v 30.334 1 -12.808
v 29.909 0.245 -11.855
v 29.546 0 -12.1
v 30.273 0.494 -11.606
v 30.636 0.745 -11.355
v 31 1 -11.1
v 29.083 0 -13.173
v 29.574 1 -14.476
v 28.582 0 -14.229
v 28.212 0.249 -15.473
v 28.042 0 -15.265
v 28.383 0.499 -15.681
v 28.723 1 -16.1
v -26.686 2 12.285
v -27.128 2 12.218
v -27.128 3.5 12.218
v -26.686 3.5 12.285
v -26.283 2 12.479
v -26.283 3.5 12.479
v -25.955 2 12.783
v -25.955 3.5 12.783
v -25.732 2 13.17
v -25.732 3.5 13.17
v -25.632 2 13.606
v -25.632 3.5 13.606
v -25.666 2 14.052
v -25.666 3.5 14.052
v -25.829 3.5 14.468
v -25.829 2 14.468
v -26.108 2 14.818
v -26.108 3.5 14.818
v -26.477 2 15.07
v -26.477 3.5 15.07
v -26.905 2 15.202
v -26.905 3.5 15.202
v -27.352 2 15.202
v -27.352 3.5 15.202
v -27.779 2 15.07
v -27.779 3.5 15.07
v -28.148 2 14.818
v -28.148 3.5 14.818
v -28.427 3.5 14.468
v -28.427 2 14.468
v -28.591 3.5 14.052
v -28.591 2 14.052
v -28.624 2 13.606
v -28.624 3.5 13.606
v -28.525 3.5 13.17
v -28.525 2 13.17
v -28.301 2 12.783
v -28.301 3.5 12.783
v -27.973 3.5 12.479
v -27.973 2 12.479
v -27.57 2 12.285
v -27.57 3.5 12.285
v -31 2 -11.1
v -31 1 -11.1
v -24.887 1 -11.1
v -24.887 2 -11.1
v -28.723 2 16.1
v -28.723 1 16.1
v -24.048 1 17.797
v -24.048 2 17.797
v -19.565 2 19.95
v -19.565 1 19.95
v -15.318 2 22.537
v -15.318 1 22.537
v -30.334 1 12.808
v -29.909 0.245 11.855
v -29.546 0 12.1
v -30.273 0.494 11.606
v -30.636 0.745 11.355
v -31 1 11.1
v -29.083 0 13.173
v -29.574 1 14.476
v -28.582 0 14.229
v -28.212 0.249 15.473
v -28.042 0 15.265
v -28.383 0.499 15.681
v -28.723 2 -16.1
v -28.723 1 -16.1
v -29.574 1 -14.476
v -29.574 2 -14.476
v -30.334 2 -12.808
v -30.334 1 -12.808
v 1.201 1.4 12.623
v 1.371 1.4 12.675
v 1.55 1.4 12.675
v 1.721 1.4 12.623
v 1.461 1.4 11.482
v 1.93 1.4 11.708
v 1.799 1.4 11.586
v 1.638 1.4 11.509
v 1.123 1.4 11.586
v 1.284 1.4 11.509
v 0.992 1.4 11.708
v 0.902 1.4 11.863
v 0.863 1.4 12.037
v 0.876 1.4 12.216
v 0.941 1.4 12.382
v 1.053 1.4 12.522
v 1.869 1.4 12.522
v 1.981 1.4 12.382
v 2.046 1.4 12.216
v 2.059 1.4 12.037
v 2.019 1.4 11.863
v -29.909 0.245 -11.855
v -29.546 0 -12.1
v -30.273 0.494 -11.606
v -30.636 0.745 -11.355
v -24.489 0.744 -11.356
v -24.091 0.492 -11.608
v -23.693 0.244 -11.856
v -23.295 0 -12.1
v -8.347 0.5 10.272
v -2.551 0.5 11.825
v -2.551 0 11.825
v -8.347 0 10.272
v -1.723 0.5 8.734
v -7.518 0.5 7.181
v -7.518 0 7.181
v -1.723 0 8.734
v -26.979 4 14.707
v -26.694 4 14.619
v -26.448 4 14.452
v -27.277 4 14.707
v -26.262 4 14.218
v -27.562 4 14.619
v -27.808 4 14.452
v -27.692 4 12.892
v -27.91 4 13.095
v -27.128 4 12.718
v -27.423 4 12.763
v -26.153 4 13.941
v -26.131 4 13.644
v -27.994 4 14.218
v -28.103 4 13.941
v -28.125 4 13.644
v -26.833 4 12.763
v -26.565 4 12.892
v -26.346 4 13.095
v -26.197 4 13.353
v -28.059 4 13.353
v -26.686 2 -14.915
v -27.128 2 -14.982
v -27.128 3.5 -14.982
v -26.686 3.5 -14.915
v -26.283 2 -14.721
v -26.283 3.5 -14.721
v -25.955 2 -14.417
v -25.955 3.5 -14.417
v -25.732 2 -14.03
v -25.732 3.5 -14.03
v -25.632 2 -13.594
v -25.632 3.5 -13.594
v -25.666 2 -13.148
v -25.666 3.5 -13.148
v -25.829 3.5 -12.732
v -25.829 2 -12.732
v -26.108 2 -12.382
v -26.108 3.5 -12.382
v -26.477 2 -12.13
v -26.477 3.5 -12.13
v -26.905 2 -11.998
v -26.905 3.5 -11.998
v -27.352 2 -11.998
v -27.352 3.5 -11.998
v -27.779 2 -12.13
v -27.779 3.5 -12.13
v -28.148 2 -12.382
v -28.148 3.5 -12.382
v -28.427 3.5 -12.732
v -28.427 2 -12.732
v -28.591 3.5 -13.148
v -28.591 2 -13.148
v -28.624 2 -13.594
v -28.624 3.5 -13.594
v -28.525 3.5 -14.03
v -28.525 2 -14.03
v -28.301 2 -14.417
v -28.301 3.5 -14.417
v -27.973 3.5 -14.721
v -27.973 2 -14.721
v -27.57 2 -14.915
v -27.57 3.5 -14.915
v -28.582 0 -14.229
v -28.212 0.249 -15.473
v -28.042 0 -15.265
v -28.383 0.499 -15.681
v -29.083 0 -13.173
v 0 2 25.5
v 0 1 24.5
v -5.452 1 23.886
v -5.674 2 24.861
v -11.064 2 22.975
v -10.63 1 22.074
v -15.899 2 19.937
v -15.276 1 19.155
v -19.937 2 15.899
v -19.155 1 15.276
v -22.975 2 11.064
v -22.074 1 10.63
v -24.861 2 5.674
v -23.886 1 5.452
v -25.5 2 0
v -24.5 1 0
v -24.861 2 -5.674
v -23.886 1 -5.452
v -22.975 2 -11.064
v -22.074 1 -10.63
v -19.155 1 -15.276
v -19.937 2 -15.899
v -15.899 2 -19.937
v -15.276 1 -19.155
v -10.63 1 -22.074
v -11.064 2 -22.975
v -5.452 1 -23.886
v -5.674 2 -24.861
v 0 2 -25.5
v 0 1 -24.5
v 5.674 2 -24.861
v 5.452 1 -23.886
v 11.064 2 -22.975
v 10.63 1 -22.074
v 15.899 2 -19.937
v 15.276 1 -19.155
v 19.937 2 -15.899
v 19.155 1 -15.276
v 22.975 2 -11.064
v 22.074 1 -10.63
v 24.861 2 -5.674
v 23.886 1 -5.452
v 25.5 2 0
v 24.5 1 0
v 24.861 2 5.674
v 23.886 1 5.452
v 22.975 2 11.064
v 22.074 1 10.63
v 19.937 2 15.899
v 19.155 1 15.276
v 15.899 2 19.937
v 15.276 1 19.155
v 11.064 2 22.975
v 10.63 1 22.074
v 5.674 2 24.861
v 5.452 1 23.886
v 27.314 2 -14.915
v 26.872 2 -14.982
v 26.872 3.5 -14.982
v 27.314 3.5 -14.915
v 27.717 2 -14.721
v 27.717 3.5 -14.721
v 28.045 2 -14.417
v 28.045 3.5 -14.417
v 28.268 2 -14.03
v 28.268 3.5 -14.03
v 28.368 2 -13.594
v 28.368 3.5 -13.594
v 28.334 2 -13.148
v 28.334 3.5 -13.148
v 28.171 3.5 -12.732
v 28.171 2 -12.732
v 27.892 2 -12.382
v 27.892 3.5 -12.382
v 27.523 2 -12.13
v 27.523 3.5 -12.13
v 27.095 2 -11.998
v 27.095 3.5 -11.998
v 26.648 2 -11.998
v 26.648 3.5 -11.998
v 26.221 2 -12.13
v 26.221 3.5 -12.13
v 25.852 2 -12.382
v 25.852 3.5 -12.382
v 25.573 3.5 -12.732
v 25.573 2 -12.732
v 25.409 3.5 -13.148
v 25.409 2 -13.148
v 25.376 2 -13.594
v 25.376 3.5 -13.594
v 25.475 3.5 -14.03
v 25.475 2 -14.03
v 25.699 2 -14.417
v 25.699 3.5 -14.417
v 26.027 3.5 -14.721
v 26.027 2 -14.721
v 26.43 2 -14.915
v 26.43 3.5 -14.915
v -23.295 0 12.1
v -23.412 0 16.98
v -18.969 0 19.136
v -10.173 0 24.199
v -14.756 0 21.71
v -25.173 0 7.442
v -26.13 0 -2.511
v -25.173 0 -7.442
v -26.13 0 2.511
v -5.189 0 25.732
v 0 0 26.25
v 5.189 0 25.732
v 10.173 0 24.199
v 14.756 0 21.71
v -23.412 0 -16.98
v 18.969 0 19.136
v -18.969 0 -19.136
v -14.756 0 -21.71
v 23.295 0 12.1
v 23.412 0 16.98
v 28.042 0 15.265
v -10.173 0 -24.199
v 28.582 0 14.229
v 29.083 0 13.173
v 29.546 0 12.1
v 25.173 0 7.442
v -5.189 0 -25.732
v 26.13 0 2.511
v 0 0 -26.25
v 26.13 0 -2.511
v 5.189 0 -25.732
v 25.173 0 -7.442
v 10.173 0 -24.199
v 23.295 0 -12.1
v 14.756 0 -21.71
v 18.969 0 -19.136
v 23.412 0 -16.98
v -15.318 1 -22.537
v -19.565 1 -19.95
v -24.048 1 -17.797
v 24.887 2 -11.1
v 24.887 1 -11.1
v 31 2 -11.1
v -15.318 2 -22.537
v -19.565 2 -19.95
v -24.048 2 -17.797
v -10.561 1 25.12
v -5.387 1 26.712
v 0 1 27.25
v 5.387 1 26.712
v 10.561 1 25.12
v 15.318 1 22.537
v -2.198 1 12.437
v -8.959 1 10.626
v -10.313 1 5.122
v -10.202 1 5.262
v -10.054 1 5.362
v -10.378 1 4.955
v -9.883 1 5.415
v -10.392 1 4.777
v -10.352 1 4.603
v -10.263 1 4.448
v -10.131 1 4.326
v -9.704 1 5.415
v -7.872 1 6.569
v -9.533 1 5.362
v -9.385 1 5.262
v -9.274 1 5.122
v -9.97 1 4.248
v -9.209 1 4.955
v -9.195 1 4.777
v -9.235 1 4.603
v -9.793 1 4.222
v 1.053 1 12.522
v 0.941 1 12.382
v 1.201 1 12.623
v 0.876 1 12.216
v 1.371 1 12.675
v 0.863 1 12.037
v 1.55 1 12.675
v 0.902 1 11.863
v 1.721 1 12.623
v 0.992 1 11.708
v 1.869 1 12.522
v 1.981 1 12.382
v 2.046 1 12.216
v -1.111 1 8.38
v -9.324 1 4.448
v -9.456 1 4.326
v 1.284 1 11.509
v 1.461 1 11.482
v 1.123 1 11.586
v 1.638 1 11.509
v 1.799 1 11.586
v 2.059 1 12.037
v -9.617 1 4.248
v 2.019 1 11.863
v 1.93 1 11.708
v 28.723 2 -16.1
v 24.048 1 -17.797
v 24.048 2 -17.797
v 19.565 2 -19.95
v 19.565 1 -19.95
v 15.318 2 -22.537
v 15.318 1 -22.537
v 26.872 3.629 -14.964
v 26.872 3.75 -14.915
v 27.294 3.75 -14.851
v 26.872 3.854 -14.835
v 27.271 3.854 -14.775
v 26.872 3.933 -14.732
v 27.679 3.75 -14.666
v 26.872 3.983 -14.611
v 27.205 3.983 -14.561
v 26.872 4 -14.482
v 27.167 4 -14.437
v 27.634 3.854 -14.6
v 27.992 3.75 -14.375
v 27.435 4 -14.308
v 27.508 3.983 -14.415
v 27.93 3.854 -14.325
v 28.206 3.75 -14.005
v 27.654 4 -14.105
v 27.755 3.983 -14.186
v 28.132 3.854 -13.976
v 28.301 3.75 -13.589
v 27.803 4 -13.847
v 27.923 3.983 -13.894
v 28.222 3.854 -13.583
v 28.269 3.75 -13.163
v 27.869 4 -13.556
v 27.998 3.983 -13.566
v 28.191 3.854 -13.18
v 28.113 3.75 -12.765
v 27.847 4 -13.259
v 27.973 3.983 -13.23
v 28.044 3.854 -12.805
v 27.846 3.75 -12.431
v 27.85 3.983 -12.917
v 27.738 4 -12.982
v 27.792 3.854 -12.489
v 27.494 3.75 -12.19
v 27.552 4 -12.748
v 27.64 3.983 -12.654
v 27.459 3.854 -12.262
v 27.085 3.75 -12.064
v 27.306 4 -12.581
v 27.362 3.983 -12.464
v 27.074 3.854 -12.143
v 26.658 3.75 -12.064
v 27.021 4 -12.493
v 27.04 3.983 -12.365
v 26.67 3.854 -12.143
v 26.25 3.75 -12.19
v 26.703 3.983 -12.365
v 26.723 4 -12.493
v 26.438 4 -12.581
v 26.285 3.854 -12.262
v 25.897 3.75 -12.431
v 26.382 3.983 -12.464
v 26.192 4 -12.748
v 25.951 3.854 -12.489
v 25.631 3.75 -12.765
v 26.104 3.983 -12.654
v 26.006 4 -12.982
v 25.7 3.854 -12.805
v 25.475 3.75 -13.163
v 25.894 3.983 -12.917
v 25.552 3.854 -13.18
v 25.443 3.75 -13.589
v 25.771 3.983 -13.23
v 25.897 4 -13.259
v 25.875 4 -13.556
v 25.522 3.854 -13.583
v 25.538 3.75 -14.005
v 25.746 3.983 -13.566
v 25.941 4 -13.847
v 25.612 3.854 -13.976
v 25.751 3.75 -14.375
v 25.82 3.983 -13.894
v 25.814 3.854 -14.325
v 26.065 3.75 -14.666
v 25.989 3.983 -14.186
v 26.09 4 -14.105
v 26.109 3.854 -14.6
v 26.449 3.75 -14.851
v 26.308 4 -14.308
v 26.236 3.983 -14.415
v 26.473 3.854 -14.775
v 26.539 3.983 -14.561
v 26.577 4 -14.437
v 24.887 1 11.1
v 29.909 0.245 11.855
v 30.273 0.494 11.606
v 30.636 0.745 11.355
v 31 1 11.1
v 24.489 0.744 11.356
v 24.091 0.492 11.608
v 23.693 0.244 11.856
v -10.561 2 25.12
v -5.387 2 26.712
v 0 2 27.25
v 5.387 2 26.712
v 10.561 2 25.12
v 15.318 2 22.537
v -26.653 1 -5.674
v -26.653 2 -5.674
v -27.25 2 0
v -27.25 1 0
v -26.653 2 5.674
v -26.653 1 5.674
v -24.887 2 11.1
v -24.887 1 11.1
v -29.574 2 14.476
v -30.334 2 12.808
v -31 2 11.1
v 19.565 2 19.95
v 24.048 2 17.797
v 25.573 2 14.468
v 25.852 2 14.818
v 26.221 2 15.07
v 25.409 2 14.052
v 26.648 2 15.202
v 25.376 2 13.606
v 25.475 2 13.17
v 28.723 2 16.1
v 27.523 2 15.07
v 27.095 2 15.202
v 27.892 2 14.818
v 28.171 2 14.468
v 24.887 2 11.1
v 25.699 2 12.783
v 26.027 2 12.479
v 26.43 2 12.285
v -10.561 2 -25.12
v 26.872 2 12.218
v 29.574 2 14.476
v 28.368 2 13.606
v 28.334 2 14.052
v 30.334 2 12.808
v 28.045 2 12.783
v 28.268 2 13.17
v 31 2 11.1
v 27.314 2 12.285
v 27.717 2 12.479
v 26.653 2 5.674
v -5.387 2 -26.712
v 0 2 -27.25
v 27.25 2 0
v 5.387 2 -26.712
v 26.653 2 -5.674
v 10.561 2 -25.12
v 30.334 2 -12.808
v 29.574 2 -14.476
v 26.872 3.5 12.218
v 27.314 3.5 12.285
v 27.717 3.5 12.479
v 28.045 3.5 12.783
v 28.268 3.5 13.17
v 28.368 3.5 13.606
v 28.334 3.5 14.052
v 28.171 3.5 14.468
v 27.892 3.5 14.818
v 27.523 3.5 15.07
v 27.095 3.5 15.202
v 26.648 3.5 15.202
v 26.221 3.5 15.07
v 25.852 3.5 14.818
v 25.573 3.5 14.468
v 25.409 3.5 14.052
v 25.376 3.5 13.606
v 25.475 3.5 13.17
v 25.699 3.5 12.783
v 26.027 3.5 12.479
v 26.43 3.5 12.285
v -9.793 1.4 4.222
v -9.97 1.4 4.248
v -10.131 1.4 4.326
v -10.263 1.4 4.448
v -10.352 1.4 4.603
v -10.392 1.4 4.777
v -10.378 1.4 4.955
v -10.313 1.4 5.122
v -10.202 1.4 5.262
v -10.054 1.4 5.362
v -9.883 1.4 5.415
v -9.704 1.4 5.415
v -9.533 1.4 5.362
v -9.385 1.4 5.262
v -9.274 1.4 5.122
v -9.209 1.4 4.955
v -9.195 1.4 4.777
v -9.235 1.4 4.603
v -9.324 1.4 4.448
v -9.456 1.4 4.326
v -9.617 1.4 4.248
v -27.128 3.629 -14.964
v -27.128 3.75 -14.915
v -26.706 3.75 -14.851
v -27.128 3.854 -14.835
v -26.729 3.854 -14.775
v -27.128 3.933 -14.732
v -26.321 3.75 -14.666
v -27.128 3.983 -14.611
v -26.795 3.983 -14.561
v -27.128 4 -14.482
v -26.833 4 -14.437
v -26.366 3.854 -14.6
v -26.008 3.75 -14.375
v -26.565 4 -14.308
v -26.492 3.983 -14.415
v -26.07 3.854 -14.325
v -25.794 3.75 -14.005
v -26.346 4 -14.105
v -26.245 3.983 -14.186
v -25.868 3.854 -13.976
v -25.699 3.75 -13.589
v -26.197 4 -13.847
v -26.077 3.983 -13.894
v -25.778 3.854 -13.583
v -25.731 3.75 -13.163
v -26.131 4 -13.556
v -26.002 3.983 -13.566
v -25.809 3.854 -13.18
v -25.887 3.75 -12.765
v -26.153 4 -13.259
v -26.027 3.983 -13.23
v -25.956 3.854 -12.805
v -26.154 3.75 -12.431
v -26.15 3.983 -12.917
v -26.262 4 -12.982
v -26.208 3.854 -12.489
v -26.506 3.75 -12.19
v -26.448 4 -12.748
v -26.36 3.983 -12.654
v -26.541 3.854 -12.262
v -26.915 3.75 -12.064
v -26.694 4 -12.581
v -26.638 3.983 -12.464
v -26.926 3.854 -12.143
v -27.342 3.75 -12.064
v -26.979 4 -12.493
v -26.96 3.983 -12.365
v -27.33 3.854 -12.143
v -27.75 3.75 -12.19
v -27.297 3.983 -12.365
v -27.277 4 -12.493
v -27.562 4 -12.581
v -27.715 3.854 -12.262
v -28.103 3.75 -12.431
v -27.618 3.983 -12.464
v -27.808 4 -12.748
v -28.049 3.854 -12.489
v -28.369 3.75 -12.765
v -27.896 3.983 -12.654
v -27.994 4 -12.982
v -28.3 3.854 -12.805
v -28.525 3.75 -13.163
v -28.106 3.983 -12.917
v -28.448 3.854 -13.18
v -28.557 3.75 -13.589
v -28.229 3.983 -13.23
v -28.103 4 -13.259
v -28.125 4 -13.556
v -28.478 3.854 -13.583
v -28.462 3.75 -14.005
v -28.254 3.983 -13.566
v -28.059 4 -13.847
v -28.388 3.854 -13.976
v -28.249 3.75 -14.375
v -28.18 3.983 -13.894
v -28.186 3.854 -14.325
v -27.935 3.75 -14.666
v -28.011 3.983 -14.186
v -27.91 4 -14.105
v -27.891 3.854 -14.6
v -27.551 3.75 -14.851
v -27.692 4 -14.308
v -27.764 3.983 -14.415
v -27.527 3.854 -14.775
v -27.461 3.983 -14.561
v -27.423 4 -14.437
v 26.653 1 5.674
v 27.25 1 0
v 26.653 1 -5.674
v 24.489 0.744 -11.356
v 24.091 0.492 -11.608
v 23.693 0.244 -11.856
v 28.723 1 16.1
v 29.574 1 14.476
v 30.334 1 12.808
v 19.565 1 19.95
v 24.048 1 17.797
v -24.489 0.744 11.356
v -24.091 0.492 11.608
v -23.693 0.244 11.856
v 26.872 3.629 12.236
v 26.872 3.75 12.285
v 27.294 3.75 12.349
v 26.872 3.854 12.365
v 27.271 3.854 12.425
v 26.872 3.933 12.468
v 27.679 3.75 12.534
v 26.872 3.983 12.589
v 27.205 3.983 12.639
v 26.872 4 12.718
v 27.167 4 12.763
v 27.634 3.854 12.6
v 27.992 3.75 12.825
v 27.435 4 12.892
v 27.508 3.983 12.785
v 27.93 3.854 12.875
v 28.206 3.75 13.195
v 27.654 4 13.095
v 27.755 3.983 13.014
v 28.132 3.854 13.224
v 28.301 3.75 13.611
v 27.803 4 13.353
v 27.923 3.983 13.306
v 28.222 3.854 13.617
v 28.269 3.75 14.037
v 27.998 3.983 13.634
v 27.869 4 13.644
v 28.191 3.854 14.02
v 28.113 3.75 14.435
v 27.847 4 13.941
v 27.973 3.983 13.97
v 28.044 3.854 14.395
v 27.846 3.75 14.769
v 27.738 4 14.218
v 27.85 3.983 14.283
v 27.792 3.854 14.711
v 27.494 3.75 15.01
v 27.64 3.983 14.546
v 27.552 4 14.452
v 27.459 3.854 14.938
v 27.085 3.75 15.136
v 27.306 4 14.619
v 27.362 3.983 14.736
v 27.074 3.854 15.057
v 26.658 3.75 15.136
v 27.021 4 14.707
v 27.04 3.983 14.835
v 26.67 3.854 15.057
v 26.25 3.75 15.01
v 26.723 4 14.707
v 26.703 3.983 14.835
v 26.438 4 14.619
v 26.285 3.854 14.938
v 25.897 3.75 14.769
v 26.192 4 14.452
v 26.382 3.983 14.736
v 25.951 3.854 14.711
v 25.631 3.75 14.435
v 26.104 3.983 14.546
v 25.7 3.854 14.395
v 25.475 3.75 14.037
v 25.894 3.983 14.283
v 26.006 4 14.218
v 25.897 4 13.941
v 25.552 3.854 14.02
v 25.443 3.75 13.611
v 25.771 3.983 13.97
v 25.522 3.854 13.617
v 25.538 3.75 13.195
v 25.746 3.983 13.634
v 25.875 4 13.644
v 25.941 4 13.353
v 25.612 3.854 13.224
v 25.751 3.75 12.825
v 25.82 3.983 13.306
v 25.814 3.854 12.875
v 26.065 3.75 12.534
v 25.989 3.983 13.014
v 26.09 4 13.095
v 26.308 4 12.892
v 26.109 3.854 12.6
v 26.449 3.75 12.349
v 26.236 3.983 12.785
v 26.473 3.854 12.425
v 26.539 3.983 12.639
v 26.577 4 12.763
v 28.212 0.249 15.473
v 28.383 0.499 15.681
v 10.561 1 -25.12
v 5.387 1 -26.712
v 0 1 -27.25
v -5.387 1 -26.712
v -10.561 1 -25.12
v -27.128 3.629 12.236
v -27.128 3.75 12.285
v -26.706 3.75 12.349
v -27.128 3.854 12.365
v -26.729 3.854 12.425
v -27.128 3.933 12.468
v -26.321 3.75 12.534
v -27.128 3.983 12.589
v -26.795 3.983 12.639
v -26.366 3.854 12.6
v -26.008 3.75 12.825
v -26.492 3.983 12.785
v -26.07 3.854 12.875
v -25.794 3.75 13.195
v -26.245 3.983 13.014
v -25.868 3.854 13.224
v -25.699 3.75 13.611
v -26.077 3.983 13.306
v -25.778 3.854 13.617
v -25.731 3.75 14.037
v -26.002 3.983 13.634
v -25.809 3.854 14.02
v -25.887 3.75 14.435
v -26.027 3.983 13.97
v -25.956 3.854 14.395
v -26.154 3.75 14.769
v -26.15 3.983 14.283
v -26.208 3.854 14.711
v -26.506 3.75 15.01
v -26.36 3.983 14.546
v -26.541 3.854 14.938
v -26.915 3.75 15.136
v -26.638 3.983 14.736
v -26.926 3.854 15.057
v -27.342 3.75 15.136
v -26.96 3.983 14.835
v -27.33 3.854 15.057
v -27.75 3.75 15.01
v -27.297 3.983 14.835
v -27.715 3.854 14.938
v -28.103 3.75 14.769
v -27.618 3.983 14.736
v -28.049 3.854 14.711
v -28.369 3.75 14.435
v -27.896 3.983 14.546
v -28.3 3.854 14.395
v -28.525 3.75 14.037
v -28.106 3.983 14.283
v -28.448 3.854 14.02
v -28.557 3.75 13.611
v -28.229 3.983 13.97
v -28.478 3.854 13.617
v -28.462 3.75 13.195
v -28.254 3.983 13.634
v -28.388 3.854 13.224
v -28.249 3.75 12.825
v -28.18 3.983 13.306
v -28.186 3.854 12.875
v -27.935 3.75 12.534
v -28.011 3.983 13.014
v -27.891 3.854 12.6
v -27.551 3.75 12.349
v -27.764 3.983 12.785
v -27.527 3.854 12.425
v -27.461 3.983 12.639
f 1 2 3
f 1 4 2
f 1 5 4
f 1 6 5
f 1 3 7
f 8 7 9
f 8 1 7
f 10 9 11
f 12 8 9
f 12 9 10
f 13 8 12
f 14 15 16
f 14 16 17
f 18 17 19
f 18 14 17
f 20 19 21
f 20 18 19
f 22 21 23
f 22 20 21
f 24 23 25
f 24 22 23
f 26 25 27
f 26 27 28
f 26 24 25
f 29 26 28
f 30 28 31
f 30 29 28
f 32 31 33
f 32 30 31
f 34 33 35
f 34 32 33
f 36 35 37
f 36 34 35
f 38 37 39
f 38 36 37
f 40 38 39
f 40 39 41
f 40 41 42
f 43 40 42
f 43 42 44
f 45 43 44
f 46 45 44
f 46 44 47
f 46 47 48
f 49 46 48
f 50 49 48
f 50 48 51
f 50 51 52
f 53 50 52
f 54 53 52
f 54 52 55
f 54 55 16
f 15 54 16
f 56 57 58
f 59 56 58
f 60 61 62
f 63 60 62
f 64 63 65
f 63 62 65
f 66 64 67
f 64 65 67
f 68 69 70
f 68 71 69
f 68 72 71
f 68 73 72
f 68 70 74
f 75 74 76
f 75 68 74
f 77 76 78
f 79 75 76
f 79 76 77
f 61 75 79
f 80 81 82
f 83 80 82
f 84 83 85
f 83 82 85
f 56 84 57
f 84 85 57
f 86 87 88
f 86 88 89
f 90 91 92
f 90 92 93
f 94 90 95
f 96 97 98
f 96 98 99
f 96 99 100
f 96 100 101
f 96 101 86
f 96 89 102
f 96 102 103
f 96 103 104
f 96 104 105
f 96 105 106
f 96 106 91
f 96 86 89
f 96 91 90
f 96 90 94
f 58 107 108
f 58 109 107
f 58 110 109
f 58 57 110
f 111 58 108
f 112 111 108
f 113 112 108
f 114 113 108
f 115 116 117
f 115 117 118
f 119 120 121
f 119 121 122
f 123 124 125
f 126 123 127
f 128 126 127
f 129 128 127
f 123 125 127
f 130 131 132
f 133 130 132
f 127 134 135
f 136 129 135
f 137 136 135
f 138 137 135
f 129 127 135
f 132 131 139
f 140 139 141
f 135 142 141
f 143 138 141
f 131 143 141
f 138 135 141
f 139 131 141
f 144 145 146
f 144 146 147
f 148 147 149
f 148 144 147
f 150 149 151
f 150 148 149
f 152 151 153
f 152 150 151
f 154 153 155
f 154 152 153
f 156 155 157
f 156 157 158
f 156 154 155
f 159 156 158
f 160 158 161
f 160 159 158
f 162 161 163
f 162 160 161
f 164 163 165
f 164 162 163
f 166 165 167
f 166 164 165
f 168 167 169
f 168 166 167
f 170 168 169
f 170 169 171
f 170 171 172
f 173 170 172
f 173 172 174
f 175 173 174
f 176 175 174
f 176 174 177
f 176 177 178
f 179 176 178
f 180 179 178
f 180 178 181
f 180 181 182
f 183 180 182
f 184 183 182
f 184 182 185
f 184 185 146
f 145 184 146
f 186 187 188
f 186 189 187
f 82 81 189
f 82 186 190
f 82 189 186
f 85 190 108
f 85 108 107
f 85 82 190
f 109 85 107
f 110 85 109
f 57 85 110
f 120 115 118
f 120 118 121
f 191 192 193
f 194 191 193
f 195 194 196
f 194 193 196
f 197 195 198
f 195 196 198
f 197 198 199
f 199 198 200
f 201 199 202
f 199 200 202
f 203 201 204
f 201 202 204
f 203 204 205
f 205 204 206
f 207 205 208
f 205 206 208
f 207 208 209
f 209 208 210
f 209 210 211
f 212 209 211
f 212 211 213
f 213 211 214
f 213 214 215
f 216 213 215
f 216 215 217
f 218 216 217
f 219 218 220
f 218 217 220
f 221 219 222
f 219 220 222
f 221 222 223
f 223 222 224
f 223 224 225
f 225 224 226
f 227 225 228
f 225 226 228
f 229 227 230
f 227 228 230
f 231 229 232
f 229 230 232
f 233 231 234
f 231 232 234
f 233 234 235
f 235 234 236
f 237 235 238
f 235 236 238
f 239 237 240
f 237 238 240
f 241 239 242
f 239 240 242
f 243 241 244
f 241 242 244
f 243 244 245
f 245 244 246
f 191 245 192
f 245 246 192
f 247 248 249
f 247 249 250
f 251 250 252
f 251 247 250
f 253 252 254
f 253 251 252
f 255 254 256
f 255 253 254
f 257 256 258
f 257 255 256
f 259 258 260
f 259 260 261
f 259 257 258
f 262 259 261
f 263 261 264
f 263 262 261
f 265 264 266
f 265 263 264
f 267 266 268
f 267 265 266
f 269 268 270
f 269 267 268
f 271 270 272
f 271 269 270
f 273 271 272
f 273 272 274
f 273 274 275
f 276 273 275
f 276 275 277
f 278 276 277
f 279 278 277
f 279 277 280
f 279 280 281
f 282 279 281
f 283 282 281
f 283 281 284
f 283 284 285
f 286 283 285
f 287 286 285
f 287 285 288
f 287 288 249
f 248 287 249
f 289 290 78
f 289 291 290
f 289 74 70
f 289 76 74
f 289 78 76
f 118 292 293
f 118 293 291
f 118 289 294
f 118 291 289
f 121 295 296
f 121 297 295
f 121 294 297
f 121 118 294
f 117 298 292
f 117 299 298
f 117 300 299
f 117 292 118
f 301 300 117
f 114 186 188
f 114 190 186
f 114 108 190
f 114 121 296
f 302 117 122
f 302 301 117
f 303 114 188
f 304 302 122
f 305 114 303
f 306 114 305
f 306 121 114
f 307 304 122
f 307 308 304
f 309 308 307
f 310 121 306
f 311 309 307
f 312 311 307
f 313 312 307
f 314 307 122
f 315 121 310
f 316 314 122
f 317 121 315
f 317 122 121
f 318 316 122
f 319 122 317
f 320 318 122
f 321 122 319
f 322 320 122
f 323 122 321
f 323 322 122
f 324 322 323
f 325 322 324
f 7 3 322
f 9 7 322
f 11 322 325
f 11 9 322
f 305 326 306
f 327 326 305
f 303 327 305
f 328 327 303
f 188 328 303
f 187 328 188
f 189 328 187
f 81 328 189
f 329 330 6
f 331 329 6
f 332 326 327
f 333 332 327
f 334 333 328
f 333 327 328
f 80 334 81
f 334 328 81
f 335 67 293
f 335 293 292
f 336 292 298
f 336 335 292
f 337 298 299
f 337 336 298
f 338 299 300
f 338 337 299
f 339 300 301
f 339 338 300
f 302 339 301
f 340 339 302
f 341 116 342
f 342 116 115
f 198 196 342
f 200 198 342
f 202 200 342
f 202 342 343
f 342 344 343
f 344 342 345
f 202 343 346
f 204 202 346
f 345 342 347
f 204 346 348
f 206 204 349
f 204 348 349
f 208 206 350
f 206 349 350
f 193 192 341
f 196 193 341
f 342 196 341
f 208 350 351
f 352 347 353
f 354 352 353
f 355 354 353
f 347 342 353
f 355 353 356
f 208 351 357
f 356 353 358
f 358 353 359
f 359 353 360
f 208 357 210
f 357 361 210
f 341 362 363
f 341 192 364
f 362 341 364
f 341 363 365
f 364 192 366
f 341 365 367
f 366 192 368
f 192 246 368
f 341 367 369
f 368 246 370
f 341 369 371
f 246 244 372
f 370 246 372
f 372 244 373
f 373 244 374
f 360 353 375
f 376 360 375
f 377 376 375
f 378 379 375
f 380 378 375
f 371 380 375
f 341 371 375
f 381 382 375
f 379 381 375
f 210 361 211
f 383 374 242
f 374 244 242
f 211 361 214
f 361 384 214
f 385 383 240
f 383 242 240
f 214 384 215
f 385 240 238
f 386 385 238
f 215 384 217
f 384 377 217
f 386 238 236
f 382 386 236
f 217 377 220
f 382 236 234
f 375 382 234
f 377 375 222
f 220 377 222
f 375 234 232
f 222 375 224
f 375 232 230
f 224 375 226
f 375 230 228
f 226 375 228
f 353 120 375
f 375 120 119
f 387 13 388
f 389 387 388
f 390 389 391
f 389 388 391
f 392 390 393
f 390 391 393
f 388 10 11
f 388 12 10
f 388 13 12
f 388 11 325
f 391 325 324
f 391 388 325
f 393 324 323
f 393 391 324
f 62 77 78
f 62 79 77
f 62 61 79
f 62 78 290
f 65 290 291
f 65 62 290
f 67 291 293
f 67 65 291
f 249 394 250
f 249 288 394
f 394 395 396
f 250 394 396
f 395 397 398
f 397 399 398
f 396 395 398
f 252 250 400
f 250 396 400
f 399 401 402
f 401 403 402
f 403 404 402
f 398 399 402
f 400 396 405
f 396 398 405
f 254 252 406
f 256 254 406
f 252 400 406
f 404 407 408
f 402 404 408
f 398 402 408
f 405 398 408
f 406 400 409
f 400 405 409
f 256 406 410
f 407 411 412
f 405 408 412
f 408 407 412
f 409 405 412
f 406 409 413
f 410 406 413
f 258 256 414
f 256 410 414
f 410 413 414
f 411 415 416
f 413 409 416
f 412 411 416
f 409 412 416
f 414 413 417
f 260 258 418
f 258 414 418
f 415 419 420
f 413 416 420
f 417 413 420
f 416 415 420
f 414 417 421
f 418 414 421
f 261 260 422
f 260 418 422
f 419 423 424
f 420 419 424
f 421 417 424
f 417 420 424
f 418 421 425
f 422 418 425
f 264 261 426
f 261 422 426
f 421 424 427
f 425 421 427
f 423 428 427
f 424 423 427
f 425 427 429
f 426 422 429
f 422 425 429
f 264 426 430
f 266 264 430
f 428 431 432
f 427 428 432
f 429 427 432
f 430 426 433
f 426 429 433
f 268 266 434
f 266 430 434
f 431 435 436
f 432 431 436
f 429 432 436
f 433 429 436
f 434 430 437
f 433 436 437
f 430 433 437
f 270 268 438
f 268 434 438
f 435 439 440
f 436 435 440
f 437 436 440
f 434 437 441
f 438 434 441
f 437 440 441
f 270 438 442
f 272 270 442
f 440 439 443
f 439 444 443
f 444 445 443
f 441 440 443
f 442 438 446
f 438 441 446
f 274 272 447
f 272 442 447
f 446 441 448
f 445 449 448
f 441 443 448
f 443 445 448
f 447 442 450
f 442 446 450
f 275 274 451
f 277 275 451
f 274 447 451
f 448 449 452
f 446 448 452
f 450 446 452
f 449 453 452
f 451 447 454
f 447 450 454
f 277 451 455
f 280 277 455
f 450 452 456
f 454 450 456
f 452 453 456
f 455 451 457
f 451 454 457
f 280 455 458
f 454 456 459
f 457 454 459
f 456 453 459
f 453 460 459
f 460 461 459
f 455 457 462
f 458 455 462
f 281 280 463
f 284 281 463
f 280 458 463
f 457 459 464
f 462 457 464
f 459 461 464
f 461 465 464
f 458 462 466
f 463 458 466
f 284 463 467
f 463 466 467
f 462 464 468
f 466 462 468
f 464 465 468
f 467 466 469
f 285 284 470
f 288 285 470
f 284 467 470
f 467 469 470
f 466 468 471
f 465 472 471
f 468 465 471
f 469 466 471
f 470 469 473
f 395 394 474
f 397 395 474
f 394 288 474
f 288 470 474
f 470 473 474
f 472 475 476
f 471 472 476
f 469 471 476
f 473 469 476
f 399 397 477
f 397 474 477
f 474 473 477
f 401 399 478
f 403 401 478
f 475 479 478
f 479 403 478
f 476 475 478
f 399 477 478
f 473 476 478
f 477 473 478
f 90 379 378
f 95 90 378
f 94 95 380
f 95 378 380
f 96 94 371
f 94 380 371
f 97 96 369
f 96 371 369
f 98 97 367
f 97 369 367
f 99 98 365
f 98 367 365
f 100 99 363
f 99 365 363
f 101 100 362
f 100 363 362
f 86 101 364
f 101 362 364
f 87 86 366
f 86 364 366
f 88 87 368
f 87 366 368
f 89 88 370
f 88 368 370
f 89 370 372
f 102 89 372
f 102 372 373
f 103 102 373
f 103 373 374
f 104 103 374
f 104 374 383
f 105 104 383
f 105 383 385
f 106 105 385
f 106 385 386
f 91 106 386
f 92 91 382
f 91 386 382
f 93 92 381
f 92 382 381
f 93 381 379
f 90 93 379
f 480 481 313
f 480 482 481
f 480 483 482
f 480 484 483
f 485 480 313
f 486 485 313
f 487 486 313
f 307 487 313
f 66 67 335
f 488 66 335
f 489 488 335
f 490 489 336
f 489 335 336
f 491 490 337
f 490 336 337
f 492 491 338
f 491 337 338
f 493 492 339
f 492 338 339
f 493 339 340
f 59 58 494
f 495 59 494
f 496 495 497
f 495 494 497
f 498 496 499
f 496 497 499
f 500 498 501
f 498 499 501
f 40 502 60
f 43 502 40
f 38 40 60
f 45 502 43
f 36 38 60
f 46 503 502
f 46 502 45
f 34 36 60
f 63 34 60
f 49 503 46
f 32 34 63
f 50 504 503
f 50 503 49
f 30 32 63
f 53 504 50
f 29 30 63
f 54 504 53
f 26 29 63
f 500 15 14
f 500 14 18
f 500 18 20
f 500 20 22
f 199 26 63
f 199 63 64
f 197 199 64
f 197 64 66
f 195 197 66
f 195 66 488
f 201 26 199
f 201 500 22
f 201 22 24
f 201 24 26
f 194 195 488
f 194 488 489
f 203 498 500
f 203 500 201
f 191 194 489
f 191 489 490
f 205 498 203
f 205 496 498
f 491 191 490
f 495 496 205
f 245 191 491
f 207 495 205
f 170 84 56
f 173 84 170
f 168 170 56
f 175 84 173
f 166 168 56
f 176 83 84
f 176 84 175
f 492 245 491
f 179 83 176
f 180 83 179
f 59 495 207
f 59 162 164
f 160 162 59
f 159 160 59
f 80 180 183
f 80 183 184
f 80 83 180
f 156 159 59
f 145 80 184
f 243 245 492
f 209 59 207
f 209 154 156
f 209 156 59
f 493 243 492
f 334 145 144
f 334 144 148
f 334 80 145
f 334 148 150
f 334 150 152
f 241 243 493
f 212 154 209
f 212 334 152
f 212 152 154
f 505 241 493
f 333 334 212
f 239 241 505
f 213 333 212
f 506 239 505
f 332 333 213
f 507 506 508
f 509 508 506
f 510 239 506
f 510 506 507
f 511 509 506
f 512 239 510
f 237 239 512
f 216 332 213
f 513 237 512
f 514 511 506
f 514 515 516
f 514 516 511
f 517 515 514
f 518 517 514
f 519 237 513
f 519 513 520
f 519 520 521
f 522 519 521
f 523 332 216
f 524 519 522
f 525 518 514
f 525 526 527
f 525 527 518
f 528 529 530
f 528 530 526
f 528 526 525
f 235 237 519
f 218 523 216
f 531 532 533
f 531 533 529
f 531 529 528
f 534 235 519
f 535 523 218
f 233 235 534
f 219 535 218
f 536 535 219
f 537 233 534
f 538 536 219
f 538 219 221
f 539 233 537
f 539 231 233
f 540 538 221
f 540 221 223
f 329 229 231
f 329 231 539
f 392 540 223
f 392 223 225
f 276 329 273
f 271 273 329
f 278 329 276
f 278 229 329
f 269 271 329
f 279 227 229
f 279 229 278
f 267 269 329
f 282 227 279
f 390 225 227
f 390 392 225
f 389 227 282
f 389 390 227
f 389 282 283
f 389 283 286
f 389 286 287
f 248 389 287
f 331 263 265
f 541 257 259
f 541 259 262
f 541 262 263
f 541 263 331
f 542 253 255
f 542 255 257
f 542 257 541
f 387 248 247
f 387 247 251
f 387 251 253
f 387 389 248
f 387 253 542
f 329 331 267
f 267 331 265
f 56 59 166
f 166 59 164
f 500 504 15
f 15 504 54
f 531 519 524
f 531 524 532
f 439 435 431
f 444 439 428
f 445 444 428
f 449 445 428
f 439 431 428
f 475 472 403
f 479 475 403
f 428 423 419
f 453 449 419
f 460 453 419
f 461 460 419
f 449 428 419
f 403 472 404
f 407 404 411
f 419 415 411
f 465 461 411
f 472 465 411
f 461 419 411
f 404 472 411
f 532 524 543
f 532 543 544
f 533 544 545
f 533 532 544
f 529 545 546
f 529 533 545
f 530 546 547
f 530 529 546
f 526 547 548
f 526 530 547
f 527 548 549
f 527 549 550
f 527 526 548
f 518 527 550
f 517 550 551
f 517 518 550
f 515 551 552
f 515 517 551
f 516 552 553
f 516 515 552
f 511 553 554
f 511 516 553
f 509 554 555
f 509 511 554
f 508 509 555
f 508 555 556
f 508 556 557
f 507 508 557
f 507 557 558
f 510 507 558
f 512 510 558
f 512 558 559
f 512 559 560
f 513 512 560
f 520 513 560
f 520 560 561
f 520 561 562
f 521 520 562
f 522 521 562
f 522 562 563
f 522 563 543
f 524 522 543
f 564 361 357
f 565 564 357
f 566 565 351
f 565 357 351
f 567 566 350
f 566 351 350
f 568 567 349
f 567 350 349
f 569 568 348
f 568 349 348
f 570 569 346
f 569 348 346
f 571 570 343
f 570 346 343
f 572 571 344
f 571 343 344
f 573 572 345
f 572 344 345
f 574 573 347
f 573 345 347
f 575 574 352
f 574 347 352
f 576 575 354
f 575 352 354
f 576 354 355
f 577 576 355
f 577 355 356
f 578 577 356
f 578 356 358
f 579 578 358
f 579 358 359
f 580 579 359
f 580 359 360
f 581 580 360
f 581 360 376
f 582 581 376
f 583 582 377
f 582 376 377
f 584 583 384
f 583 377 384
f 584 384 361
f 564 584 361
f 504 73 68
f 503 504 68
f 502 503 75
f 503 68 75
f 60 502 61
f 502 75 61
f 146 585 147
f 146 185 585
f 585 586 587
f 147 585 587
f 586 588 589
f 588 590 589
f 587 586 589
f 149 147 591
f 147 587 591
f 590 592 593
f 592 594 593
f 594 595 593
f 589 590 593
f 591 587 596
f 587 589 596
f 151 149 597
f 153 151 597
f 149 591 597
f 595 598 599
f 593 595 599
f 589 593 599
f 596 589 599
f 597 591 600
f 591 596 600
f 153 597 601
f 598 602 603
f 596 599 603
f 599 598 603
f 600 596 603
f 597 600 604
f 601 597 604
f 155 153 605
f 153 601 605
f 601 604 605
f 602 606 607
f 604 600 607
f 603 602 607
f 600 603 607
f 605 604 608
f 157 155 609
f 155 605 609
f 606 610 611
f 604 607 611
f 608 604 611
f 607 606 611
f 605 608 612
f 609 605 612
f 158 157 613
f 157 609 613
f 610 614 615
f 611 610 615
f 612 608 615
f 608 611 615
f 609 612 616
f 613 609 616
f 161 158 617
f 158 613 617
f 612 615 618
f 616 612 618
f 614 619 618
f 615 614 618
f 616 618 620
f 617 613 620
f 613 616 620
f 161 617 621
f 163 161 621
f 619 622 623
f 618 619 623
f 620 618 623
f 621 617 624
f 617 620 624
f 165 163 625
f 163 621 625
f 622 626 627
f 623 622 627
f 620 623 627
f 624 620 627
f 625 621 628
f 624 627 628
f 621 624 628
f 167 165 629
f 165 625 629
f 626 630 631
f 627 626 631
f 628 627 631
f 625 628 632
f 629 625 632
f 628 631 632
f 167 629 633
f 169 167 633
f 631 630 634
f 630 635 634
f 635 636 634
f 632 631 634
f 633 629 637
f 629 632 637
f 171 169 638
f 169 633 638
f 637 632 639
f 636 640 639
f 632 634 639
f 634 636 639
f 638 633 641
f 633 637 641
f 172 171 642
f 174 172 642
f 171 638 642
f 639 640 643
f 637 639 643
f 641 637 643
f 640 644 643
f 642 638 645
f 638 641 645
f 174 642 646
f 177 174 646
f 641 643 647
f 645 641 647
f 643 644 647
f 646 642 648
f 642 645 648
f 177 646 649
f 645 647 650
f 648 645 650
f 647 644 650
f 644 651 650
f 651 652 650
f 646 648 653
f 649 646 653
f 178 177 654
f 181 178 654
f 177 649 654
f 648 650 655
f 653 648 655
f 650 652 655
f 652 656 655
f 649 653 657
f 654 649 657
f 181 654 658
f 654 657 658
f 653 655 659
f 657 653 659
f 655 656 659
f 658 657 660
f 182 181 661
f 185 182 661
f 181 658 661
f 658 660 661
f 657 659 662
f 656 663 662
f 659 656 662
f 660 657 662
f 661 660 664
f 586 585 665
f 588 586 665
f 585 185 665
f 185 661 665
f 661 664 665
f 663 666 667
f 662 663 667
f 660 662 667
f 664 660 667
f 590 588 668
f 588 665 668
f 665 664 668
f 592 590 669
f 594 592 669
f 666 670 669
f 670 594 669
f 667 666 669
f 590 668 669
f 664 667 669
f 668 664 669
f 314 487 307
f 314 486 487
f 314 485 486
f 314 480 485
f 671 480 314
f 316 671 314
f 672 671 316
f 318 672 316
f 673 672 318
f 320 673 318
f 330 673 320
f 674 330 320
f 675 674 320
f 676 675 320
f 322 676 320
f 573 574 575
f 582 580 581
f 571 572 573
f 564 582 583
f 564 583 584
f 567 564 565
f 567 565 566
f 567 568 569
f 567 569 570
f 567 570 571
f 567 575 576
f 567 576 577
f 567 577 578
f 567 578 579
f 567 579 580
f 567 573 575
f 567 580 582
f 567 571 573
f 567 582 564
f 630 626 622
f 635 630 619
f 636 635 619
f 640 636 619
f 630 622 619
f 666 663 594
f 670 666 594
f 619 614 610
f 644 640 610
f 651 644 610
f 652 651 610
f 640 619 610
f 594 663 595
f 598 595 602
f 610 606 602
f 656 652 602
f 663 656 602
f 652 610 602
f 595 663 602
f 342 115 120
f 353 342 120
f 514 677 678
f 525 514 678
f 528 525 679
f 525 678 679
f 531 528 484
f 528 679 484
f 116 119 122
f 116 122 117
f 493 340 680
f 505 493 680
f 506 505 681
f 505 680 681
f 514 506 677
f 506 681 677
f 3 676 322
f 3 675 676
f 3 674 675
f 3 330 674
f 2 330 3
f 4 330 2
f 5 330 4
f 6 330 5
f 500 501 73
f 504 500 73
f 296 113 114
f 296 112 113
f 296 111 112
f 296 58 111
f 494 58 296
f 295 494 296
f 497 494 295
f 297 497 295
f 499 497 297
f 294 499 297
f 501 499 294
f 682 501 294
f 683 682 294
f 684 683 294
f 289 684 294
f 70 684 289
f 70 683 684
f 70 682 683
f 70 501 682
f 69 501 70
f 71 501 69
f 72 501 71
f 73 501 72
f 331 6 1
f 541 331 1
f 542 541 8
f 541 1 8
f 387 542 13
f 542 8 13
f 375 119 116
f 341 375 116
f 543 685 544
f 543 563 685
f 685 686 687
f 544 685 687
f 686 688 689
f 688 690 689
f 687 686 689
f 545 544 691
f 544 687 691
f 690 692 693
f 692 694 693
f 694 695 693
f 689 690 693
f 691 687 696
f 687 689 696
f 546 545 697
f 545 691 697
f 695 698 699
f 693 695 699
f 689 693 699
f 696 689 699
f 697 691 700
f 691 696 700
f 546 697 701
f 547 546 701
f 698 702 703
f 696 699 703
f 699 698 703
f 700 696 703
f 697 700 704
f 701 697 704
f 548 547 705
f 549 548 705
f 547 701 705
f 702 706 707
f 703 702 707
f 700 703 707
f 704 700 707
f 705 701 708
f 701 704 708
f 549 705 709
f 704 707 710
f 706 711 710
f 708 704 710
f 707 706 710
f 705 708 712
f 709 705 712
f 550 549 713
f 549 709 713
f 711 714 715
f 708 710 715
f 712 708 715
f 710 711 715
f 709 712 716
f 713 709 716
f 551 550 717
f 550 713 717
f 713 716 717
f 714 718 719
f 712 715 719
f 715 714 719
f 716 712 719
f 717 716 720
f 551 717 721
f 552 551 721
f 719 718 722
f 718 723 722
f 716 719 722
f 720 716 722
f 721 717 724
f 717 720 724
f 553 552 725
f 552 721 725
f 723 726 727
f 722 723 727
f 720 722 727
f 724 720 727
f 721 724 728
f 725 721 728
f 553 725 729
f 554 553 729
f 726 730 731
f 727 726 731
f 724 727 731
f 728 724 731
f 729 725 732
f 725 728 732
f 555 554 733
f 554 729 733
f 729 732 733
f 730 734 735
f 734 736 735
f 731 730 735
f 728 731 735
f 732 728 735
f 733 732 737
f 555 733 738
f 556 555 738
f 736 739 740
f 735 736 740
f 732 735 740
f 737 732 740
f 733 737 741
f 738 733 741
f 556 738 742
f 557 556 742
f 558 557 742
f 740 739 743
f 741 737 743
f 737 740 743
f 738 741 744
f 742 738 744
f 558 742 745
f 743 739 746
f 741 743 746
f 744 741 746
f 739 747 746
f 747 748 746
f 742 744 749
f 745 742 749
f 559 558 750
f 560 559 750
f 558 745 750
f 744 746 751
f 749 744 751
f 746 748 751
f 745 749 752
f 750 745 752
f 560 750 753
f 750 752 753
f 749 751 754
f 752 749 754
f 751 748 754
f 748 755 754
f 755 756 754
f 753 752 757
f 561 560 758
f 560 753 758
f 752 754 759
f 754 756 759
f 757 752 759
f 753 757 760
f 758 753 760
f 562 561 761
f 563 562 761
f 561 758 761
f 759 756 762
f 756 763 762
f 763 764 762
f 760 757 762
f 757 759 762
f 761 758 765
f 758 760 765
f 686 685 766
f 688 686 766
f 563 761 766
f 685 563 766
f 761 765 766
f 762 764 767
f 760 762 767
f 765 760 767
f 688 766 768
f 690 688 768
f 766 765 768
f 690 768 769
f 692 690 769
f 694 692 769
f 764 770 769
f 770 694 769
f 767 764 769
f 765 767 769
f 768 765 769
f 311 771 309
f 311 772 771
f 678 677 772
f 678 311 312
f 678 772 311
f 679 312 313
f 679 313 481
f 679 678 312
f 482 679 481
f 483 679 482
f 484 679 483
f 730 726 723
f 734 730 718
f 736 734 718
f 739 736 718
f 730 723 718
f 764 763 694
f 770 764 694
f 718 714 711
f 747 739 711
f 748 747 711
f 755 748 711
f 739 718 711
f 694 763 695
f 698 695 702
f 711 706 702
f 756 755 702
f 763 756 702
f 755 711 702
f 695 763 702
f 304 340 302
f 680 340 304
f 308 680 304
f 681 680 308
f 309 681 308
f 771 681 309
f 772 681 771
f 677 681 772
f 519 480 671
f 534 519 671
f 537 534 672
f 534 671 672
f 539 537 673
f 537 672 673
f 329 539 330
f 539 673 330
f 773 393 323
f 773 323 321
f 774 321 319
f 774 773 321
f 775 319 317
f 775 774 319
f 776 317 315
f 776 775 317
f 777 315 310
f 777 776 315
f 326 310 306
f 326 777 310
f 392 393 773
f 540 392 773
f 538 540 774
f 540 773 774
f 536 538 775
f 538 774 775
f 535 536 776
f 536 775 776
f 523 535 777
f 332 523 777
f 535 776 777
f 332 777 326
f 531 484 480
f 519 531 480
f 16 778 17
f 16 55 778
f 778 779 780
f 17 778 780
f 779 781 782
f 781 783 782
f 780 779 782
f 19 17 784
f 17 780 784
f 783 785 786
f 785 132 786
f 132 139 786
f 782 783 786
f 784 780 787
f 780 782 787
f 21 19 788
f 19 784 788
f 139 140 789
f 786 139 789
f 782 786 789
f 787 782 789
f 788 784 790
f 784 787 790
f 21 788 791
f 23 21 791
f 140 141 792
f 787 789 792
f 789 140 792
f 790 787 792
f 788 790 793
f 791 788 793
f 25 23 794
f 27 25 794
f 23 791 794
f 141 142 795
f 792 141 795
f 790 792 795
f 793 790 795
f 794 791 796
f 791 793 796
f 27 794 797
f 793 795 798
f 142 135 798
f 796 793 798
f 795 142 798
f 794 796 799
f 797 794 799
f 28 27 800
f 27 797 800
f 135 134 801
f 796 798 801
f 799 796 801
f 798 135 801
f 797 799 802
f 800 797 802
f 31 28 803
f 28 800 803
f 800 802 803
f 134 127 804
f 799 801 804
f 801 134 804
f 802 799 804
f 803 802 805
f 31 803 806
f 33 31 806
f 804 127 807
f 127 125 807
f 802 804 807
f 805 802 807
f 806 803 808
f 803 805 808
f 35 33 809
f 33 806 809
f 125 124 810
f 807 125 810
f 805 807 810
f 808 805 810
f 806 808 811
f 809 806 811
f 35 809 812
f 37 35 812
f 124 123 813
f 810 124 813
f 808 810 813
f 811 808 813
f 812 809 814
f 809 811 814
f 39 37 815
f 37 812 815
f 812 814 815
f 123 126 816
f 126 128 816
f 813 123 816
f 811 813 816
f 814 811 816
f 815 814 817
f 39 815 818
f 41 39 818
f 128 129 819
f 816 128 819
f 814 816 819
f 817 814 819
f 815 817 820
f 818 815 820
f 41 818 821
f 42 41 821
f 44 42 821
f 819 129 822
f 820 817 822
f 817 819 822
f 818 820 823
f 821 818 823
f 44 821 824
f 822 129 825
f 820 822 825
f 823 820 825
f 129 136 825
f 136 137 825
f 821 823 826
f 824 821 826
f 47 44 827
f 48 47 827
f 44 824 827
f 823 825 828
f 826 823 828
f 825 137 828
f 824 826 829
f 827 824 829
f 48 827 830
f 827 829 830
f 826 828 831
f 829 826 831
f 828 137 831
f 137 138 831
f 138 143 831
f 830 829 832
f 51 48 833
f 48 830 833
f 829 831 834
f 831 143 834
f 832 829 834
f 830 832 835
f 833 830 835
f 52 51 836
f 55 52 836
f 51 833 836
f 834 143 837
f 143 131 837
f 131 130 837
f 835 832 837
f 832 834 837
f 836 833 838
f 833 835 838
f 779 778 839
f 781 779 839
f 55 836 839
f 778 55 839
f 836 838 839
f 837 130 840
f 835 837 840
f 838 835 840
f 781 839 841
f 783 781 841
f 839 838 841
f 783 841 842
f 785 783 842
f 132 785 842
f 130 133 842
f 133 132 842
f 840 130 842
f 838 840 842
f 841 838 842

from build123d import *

# Parameters (mm, degrees)
SKETCH1_R           = 1.2
SKETCH1_R_2         = 27.25
SKETCH1_R_3         = 25.5
BOSS_EXTRUDE1_DEPTH = 2
SKETCH2_R           = 25.5
BOSS_EXTRUDE3_DEPTH = 1
SKETCH3_R           = 1.5
BOSS_EXTRUDE4_DEPTH = 4
CHAMFER1_SIZE       = 1
CHAMFER2_SIZE       = 1
CUT_EXTRUDE1_DEPTH  = 2
SKETCH5_R           = 0.6
BOSS_EXTRUDE5_DEPTH = 0.4
CHAMFER3_SIZE       = 0.5
FILLET1_R           = 0.5


with BuildPart() as part:
    # Sketch1 → Boss-Extrude1 (new body)
    # profile 1 of 5: a face of its own
    with BuildSketch(Plane(origin=(0, 0, 0), x_dir=(1, 0, 0), z_dir=(0, 1, 0))):
        with BuildLine():
            ThreePointArc((-28.722813233, 16.1), (-29.965874009, 13.647578353), (-31, 11.1))
            Line((-31, 11.1), (-24.886793687, 11.1))
            ThreePointArc((-24.886793687, 11.1), (-20.899896158, 17.485904054), (-15.317841085, 22.537219094))
            ThreePointArc((-15.317841085, 22.537219094), (-21.77967806, 18.817477861), (-28.722813233, 16.1))
        make_face()
        with Locations(Location((-27.128197522, 13.481505135, 0), (0, 0, 270))):
            Circle(SKETCH1_R, mode=Mode.SUBTRACT)
    # profile 2 of 5: a face of its own
    with BuildSketch(Plane(origin=(0, 0, 0), x_dir=(1, 0, 0), z_dir=(0, 1, 0))):
        with BuildLine():
            ThreePointArc((-15.317841085, -22.537219094), (-20.899896158, -17.485904054), (-24.886793687, -11.1))
            Line((-24.886793687, -11.1), (-31, -11.1))
            ThreePointArc((-31, -11.1), (-29.965874009, -13.647578353), (-28.722813233, -16.1))
            ThreePointArc((-28.722813233, -16.1), (-21.77967806, -18.817477861), (-15.317841085, -22.537219094))
        make_face()
        with Locations(Location((-27.128197522, -13.718494865, 0), (0, 0, 270))):
            Circle(SKETCH1_R, mode=Mode.SUBTRACT)
    # profile 3 of 5: a face of its own
    with BuildSketch(Plane(origin=(0, 0, 0), x_dir=(1, 0, 0), z_dir=(0, 1, 0))):
        Circle(SKETCH1_R_2)
        with Locations(Location((0, 0, 0), (0, 0, 270))):
            Circle(SKETCH1_R_3, mode=Mode.SUBTRACT)
    # profile 4 of 5: a face of its own
    with BuildSketch(Plane(origin=(0, 0, 0), x_dir=(1, 0, 0), z_dir=(0, 1, 0))):
        with BuildLine():
            ThreePointArc((24.886793687, -11.1), (20.899896158, -17.485904054), (15.317841085, -22.537219094))
            ThreePointArc((15.317841085, -22.537219094), (21.77967806, -18.817477861), (28.722813233, -16.1))
            ThreePointArc((28.722813233, -16.1), (29.965874009, -13.647578353), (31, -11.1))
            Line((31, -11.1), (24.886793687, -11.1))
        make_face()
        with Locations(Location((26.871802478, -13.718494865, 0), (0, 0, 270))):
            Circle(SKETCH1_R, mode=Mode.SUBTRACT)
    # profile 5 of 5: a face of its own
    with BuildSketch(Plane(origin=(0, 0, 0), x_dir=(1, 0, 0), z_dir=(0, 1, 0))):
        with BuildLine():
            ThreePointArc((28.722813233, 16.1), (21.77967806, 18.817477861), (15.317841085, 22.537219094))
            ThreePointArc((15.317841085, 22.537219094), (20.899896158, 17.485904054), (24.886793687, 11.1))
            Line((24.886793687, 11.1), (31, 11.1))
            ThreePointArc((31, 11.1), (29.965874009, 13.647578353), (28.722813233, 16.1))
        make_face()
        with Locations(Location((26.871802478, 13.481505135, 0), (0, 0, 270))):
            Circle(SKETCH1_R, mode=Mode.SUBTRACT)
    extrude(amount=BOSS_EXTRUDE1_DEPTH)

    # Sketch2 → Boss-Extrude3 (add)
    with BuildSketch(Plane.XZ):
        with Locations(Location((0, 0, 0), (0, 0, 270))):
            Circle(SKETCH2_R)
    extrude(amount=-BOSS_EXTRUDE3_DEPTH)

    # Sketch3 → Boss-Extrude4 (add)
    with BuildSketch(Plane.XZ):
        with Locations(Location((-27.128197522, 13.718494865, 0), (0, 0, 270))):
            Circle(SKETCH3_R)
        with Locations(Location((26.871802478, 13.718494865, 0), (0, 0, 270))):
            Circle(SKETCH3_R)
        with Locations(Location((26.871802478, -13.481505135, 0), (0, 0, 270))):
            Circle(SKETCH3_R)
        with Locations(Location((-27.128197522, -13.481505135, 0), (0, 0, 270))):
            Circle(SKETCH3_R)
    extrude(amount=-BOSS_EXTRUDE4_DEPTH)

    # Chamfer1
    chamfer1_edges = [part.edges().sort_by_distance(p)[0] for p in [
        (0, 0, -27.25),
        (21.77967806, 0, -18.817477861),
        (29.965874009, 0, -13.647578353),
        (27.943396843, 0, -11.1),
        (27.25, 0, 0),
        (27.943396843, 0, 11.1),
        (29.965874009, 0, 13.647578353),
        (21.77967806, 0, 18.817477861),
        (0, 0, 27.25),
        (-21.77967806, 0, 18.817477861),
        (-29.965874009, 0, 13.647578353),
        (-27.943396843, 0, 11.1),
        (-27.25, 0, 0),
        (-27.943396843, 0, -11.1),
        (-29.965874009, 0, -13.647578353),
        (-21.77967806, 0, -18.817477861),
    ]]
    chamfer(chamfer1_edges, length=CHAMFER1_SIZE)

    # Chamfer2
    chamfer2_edges = [part.edges().sort_by_distance(p)[0] for p in [
        (0, 1, -25.5),
    ]]
    chamfer(chamfer2_edges, length=CHAMFER2_SIZE - 0.0001)  # a hair under: the kernel refuses the full size

    # Sketch4 → Cut-Extrude1 (cut)
    with BuildSketch(Plane(origin=(0, 1, 0), x_dir=(1, 0, 0), z_dir=(0, 1, 0))):
        Polygon((-7.518498865, -7.181133816), (-1.722943541, -8.734046717), (-2.551163755, -11.825009557), (-8.346719079, -10.272096656), align=None)
    extrude(amount=-CUT_EXTRUDE1_DEPTH, mode=Mode.SUBTRACT)

    # Sketch5 → Boss-Extrude5 (add)
    with BuildSketch(Plane(origin=(0, 1, 0), x_dir=(1, 0, 0), z_dir=(0, 1, 0))):
        with Locations(Location((1.460899698, -12.082012325, 0), (0, 0, 90))):
            Circle(SKETCH5_R)
        with Locations(Location((-9.793498218, -4.821776272, 0), (0, 0, 90))):
            Circle(SKETCH5_R)
    extrude(amount=BOSS_EXTRUDE5_DEPTH)

    # Chamfer3
    chamfer3_edges = [part.edges().sort_by_distance(p)[0] for p in [
        (-7.932608972, 1, 8.726615236),
        (-5.448941417, 1, 11.048553106),
        (-2.137053648, 1, 10.279528137),
        (-4.620721203, 1, 7.957590266),
    ]]
    chamfer(chamfer3_edges, length=CHAMFER3_SIZE)

    # Fillet1
    fillet1_edges = [part.edges().sort_by_distance(p)[0] for p in [
        (-27.128197522, 4, 15.218494865),
        (26.871802478, 4, 15.218494865),
        (26.871802478, 4, -11.981505135),
        (-27.128197522, 4, -11.981505135),
    ]]
    fillet(fillet1_edges, radius=FILLET1_R)


solid = part.part
